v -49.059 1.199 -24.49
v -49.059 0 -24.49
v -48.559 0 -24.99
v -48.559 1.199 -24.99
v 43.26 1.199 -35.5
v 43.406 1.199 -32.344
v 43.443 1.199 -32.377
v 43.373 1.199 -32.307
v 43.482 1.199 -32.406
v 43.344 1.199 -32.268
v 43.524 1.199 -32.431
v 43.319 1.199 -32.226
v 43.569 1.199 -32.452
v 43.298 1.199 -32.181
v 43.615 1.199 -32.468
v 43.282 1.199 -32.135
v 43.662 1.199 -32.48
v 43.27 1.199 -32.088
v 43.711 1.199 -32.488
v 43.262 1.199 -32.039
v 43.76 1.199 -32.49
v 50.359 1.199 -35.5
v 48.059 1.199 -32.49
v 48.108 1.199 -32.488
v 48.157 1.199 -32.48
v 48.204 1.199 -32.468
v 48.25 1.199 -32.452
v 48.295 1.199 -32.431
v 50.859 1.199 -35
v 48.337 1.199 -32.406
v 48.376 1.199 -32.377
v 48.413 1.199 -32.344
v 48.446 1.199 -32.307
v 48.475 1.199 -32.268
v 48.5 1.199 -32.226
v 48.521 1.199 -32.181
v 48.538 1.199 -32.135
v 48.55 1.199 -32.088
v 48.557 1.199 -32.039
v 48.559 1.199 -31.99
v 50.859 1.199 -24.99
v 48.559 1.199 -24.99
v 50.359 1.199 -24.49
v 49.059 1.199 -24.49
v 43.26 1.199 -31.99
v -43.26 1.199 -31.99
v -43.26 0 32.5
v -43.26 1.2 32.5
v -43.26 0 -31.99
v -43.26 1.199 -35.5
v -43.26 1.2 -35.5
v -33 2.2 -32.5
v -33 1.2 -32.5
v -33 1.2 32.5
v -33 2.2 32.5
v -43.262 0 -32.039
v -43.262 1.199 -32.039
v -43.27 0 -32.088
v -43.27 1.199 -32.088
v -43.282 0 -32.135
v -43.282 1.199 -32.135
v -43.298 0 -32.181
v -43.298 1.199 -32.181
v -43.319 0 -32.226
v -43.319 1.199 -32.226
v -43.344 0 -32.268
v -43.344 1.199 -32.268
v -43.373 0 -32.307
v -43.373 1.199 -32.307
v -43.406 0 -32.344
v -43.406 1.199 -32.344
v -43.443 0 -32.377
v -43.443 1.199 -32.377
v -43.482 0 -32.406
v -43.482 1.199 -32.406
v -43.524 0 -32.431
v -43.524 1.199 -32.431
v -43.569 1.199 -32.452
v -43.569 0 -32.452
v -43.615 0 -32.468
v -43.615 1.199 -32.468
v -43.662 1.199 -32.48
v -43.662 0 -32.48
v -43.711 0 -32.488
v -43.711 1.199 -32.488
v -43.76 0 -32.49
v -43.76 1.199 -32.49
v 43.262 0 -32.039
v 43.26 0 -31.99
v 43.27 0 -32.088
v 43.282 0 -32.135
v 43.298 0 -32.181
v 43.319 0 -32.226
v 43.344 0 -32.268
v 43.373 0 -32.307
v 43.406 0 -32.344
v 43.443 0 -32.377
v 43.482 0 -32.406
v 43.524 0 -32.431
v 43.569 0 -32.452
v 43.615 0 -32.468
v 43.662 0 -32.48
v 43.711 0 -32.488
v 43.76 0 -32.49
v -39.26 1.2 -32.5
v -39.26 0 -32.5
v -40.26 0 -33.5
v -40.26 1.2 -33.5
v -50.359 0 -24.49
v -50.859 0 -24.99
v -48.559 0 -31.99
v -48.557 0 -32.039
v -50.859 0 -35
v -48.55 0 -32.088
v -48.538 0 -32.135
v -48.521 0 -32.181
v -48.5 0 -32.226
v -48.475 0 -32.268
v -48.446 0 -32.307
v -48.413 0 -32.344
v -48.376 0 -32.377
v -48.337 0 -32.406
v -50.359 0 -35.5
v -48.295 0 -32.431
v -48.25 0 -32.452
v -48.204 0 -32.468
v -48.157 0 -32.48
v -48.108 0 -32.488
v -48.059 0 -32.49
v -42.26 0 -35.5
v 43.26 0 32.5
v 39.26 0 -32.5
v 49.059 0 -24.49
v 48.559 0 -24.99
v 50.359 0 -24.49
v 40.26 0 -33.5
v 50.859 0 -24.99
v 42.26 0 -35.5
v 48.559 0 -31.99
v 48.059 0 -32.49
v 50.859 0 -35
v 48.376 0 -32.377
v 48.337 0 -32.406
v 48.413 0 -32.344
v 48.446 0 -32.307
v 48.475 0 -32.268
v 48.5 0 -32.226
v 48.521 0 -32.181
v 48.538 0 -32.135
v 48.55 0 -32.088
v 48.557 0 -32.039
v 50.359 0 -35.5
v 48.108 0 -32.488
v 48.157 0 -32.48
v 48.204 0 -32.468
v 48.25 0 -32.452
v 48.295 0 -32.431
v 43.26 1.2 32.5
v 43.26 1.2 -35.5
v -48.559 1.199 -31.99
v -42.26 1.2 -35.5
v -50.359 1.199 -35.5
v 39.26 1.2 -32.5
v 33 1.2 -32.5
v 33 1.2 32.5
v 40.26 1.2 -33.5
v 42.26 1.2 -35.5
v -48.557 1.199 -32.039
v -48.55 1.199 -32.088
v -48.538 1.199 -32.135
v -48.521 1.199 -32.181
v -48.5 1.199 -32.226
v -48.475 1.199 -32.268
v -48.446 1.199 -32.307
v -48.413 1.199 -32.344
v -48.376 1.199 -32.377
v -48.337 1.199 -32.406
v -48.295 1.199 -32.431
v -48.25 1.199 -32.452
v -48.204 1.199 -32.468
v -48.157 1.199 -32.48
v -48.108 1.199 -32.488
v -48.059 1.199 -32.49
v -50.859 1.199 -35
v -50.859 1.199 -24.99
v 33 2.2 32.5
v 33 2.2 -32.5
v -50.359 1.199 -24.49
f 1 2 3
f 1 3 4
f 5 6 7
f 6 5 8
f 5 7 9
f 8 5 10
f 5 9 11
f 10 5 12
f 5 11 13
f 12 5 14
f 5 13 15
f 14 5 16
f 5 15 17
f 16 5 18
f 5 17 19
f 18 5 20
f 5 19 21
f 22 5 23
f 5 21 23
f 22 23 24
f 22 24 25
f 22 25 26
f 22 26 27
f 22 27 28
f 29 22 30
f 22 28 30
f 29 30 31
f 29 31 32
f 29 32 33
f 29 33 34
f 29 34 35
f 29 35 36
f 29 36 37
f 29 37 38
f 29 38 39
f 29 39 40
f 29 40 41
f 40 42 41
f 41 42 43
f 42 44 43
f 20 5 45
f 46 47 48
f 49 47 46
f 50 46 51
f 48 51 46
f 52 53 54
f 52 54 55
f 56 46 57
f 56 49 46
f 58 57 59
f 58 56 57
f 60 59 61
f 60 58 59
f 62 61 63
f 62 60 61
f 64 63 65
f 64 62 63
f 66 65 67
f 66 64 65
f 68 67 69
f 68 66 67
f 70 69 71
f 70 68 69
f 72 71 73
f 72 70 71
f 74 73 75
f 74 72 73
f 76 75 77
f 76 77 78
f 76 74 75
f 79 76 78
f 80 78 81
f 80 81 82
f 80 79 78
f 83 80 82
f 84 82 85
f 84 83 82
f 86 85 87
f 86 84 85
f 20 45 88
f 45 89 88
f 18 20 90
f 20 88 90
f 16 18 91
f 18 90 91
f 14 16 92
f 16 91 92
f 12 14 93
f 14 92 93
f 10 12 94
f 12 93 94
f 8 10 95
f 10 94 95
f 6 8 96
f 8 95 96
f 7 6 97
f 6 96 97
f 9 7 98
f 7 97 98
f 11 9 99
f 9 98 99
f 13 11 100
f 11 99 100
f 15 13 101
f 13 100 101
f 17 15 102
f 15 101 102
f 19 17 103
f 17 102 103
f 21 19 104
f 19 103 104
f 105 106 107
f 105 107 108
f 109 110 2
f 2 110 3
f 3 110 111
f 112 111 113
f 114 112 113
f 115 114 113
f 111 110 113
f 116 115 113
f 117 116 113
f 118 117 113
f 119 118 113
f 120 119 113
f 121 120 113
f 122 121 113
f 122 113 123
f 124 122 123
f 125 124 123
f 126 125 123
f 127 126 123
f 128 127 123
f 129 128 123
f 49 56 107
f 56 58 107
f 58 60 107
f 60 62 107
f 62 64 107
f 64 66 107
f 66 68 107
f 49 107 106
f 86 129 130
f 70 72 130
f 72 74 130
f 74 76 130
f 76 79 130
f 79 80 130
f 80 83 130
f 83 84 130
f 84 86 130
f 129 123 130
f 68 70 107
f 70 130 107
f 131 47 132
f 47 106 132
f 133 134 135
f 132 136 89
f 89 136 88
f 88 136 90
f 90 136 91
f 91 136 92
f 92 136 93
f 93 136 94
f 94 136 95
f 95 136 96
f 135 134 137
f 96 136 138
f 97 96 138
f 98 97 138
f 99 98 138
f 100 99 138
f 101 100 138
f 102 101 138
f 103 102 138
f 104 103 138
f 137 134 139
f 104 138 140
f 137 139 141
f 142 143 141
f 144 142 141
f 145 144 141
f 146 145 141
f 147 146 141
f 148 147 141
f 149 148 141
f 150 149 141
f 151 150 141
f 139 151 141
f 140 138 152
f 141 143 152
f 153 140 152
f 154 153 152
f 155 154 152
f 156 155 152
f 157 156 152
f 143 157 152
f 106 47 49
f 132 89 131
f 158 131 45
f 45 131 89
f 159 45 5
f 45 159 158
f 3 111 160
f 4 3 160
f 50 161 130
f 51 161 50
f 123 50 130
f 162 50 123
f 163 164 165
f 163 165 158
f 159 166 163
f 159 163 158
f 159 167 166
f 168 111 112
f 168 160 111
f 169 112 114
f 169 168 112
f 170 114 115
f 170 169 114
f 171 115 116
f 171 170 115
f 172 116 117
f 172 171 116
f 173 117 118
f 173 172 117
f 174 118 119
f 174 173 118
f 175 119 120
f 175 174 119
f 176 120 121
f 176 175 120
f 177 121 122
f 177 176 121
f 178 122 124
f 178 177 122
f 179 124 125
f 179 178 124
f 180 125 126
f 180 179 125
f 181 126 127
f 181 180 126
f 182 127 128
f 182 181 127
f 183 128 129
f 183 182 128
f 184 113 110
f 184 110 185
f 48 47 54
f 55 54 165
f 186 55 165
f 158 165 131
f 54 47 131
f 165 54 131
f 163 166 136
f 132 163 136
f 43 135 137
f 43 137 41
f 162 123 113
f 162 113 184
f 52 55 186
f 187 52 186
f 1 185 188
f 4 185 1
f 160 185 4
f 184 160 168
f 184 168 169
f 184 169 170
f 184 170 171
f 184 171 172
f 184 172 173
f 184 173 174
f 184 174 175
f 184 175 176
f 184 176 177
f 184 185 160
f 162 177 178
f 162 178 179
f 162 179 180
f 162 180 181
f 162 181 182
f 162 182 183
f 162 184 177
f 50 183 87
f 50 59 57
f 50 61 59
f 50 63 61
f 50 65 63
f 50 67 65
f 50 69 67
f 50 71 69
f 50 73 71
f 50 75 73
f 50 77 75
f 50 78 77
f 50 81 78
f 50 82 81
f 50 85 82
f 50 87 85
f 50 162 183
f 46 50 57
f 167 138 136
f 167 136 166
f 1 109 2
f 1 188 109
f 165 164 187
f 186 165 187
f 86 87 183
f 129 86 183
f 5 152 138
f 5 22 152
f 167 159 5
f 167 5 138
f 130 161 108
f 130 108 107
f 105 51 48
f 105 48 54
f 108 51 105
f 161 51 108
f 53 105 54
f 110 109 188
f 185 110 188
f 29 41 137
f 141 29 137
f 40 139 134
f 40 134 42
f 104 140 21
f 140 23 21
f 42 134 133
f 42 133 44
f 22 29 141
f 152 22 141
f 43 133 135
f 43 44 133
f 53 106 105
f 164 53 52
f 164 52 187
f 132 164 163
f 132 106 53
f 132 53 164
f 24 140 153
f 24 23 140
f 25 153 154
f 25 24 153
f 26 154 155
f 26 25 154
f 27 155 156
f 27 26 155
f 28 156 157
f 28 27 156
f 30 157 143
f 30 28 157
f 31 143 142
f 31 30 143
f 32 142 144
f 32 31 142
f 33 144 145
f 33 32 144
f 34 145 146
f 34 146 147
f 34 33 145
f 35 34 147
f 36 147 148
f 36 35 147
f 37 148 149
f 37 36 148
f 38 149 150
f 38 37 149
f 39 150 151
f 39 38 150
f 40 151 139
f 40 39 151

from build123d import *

# Parameters (mm, degrees)
SKETCH1_W                = 86.52
SKETCH1_H                = 65
BOSS_EXTRUDE1_DEPTH      = 1.2
SKETCH2_W                = 66
SKETCH2_H                = 1
BOSS_EXTRUDE2_DEPTH      = 65
BOSS_EXTRUDE5_DEPTH      = 3
BOSS_EXTRUDE5_DEPTH_BACK = 0.01
CHAMFER1_SIZE            = 2
CHAMFER2_SIZE            = 2
CHAMFER3_SIZE            = 1
SKETCH5_W                = 2.3
SKETCH5_H                = 1.199074312
BOSS_EXTRUDE7_DEPTH      = 8
CHAMFER5_SIZE            = 0.5
FILLET3_R                = 0.5


with BuildPart() as part:
    # Sketch1 → Boss-Extrude1 (new body)
    with BuildSketch(Plane(origin=(0, 0, 0), x_dir=(1, 0, 0), z_dir=(0, 1, 0))):
        Rectangle(SKETCH1_W, SKETCH1_H)
    extrude(amount=BOSS_EXTRUDE1_DEPTH)

    # Sketch2 → Boss-Extrude2 (add)
    with BuildSketch(Plane.XY.offset(32.5)):
        with Locations((0, 1.7)):
            Rectangle(SKETCH2_W, SKETCH2_H)
    extrude(amount=-BOSS_EXTRUDE2_DEPTH)

    # Sketch3 → Boss-Extrude5 (add, two sides: drawn at the far end of the back side and taken through both)
    with BuildSketch(Plane(origin=(0, 0, -32.5), x_dir=(-1, 0, 0), z_dir=(0, 0, -1)).offset(-BOSS_EXTRUDE5_DEPTH_BACK)):
        Polygon((-43.26, 1.2), (-43.26, 1.199074312), (-50.859139548, 1.199074312), (-50.859139548, 0), (-40.26, 0), (-40.26, 1.2), align=None)
        Polygon((40.26, 1.2), (40.26, 0), (50.859139548, 0), (50.859139548, 1.199074312), (43.26, 1.199074312), (43.26, 1.2), align=None)
    extrude(amount=BOSS_EXTRUDE5_DEPTH + BOSS_EXTRUDE5_DEPTH_BACK)

    # Chamfer1
    chamfer1_edges = [part.edges().sort_by_distance(p)[0] for p in [
        (40.26, 0.6, -35.5),
    ]]
    chamfer(chamfer1_edges, length=CHAMFER1_SIZE)

    # Chamfer2
    chamfer2_edges = [part.edges().sort_by_distance(p)[0] for p in [
        (-40.26, 0.6, -35.5),
    ]]
    chamfer(chamfer2_edges, length=CHAMFER2_SIZE)

    # Chamfer3
    chamfer3_edges = [part.edges().sort_by_distance(p)[0] for p in [
        (-40.26, 0.6, -32.5),
        (40.26, 0.6, -32.5),
    ]]
    chamfer(chamfer3_edges, length=CHAMFER3_SIZE - 0.0001)  # a hair under: the kernel refuses the full size

    # Sketch5 → Boss-Extrude7 (add)
    with BuildSketch(Plane.XY.offset(-32.49)):
        with Locations((-49.709139548, 0.599537156)):
            Rectangle(SKETCH5_W, SKETCH5_H)
        with Locations((49.709139548, 0.599537156)):
            Rectangle(SKETCH5_W, SKETCH5_H)
    extrude(amount=BOSS_EXTRUDE7_DEPTH)

    # Chamfer5
    chamfer5_edges = [part.edges().sort_by_distance(p)[0] for p in [
        (-48.559139548, 0.599537156, -24.49),
        (-50.859139548, 0.599537156, -24.49),
        (50.859139548, 0.599537156, -24.49),
        (48.559139548, 0.599537156, -24.49),
        (-50.859139548, 0.599537156, -35.5),
        (50.859139548, 0.599537156, -35.5),
    ]]
    chamfer(chamfer5_edges, length=CHAMFER5_SIZE)

    # Fillet3
    fillet3_edges = [part.edges().sort_by_distance(p)[0] for p in [
        (-48.559139548, 0.599537156, -32.49),
        (48.559139548, 0.599537156, -32.49),
        (-43.26, 0.599537156, -32.49),
        (43.26, 0.599537156, -32.49),
    ]]
    fillet(fillet3_edges, radius=FILLET3_R)


solid = part.part
